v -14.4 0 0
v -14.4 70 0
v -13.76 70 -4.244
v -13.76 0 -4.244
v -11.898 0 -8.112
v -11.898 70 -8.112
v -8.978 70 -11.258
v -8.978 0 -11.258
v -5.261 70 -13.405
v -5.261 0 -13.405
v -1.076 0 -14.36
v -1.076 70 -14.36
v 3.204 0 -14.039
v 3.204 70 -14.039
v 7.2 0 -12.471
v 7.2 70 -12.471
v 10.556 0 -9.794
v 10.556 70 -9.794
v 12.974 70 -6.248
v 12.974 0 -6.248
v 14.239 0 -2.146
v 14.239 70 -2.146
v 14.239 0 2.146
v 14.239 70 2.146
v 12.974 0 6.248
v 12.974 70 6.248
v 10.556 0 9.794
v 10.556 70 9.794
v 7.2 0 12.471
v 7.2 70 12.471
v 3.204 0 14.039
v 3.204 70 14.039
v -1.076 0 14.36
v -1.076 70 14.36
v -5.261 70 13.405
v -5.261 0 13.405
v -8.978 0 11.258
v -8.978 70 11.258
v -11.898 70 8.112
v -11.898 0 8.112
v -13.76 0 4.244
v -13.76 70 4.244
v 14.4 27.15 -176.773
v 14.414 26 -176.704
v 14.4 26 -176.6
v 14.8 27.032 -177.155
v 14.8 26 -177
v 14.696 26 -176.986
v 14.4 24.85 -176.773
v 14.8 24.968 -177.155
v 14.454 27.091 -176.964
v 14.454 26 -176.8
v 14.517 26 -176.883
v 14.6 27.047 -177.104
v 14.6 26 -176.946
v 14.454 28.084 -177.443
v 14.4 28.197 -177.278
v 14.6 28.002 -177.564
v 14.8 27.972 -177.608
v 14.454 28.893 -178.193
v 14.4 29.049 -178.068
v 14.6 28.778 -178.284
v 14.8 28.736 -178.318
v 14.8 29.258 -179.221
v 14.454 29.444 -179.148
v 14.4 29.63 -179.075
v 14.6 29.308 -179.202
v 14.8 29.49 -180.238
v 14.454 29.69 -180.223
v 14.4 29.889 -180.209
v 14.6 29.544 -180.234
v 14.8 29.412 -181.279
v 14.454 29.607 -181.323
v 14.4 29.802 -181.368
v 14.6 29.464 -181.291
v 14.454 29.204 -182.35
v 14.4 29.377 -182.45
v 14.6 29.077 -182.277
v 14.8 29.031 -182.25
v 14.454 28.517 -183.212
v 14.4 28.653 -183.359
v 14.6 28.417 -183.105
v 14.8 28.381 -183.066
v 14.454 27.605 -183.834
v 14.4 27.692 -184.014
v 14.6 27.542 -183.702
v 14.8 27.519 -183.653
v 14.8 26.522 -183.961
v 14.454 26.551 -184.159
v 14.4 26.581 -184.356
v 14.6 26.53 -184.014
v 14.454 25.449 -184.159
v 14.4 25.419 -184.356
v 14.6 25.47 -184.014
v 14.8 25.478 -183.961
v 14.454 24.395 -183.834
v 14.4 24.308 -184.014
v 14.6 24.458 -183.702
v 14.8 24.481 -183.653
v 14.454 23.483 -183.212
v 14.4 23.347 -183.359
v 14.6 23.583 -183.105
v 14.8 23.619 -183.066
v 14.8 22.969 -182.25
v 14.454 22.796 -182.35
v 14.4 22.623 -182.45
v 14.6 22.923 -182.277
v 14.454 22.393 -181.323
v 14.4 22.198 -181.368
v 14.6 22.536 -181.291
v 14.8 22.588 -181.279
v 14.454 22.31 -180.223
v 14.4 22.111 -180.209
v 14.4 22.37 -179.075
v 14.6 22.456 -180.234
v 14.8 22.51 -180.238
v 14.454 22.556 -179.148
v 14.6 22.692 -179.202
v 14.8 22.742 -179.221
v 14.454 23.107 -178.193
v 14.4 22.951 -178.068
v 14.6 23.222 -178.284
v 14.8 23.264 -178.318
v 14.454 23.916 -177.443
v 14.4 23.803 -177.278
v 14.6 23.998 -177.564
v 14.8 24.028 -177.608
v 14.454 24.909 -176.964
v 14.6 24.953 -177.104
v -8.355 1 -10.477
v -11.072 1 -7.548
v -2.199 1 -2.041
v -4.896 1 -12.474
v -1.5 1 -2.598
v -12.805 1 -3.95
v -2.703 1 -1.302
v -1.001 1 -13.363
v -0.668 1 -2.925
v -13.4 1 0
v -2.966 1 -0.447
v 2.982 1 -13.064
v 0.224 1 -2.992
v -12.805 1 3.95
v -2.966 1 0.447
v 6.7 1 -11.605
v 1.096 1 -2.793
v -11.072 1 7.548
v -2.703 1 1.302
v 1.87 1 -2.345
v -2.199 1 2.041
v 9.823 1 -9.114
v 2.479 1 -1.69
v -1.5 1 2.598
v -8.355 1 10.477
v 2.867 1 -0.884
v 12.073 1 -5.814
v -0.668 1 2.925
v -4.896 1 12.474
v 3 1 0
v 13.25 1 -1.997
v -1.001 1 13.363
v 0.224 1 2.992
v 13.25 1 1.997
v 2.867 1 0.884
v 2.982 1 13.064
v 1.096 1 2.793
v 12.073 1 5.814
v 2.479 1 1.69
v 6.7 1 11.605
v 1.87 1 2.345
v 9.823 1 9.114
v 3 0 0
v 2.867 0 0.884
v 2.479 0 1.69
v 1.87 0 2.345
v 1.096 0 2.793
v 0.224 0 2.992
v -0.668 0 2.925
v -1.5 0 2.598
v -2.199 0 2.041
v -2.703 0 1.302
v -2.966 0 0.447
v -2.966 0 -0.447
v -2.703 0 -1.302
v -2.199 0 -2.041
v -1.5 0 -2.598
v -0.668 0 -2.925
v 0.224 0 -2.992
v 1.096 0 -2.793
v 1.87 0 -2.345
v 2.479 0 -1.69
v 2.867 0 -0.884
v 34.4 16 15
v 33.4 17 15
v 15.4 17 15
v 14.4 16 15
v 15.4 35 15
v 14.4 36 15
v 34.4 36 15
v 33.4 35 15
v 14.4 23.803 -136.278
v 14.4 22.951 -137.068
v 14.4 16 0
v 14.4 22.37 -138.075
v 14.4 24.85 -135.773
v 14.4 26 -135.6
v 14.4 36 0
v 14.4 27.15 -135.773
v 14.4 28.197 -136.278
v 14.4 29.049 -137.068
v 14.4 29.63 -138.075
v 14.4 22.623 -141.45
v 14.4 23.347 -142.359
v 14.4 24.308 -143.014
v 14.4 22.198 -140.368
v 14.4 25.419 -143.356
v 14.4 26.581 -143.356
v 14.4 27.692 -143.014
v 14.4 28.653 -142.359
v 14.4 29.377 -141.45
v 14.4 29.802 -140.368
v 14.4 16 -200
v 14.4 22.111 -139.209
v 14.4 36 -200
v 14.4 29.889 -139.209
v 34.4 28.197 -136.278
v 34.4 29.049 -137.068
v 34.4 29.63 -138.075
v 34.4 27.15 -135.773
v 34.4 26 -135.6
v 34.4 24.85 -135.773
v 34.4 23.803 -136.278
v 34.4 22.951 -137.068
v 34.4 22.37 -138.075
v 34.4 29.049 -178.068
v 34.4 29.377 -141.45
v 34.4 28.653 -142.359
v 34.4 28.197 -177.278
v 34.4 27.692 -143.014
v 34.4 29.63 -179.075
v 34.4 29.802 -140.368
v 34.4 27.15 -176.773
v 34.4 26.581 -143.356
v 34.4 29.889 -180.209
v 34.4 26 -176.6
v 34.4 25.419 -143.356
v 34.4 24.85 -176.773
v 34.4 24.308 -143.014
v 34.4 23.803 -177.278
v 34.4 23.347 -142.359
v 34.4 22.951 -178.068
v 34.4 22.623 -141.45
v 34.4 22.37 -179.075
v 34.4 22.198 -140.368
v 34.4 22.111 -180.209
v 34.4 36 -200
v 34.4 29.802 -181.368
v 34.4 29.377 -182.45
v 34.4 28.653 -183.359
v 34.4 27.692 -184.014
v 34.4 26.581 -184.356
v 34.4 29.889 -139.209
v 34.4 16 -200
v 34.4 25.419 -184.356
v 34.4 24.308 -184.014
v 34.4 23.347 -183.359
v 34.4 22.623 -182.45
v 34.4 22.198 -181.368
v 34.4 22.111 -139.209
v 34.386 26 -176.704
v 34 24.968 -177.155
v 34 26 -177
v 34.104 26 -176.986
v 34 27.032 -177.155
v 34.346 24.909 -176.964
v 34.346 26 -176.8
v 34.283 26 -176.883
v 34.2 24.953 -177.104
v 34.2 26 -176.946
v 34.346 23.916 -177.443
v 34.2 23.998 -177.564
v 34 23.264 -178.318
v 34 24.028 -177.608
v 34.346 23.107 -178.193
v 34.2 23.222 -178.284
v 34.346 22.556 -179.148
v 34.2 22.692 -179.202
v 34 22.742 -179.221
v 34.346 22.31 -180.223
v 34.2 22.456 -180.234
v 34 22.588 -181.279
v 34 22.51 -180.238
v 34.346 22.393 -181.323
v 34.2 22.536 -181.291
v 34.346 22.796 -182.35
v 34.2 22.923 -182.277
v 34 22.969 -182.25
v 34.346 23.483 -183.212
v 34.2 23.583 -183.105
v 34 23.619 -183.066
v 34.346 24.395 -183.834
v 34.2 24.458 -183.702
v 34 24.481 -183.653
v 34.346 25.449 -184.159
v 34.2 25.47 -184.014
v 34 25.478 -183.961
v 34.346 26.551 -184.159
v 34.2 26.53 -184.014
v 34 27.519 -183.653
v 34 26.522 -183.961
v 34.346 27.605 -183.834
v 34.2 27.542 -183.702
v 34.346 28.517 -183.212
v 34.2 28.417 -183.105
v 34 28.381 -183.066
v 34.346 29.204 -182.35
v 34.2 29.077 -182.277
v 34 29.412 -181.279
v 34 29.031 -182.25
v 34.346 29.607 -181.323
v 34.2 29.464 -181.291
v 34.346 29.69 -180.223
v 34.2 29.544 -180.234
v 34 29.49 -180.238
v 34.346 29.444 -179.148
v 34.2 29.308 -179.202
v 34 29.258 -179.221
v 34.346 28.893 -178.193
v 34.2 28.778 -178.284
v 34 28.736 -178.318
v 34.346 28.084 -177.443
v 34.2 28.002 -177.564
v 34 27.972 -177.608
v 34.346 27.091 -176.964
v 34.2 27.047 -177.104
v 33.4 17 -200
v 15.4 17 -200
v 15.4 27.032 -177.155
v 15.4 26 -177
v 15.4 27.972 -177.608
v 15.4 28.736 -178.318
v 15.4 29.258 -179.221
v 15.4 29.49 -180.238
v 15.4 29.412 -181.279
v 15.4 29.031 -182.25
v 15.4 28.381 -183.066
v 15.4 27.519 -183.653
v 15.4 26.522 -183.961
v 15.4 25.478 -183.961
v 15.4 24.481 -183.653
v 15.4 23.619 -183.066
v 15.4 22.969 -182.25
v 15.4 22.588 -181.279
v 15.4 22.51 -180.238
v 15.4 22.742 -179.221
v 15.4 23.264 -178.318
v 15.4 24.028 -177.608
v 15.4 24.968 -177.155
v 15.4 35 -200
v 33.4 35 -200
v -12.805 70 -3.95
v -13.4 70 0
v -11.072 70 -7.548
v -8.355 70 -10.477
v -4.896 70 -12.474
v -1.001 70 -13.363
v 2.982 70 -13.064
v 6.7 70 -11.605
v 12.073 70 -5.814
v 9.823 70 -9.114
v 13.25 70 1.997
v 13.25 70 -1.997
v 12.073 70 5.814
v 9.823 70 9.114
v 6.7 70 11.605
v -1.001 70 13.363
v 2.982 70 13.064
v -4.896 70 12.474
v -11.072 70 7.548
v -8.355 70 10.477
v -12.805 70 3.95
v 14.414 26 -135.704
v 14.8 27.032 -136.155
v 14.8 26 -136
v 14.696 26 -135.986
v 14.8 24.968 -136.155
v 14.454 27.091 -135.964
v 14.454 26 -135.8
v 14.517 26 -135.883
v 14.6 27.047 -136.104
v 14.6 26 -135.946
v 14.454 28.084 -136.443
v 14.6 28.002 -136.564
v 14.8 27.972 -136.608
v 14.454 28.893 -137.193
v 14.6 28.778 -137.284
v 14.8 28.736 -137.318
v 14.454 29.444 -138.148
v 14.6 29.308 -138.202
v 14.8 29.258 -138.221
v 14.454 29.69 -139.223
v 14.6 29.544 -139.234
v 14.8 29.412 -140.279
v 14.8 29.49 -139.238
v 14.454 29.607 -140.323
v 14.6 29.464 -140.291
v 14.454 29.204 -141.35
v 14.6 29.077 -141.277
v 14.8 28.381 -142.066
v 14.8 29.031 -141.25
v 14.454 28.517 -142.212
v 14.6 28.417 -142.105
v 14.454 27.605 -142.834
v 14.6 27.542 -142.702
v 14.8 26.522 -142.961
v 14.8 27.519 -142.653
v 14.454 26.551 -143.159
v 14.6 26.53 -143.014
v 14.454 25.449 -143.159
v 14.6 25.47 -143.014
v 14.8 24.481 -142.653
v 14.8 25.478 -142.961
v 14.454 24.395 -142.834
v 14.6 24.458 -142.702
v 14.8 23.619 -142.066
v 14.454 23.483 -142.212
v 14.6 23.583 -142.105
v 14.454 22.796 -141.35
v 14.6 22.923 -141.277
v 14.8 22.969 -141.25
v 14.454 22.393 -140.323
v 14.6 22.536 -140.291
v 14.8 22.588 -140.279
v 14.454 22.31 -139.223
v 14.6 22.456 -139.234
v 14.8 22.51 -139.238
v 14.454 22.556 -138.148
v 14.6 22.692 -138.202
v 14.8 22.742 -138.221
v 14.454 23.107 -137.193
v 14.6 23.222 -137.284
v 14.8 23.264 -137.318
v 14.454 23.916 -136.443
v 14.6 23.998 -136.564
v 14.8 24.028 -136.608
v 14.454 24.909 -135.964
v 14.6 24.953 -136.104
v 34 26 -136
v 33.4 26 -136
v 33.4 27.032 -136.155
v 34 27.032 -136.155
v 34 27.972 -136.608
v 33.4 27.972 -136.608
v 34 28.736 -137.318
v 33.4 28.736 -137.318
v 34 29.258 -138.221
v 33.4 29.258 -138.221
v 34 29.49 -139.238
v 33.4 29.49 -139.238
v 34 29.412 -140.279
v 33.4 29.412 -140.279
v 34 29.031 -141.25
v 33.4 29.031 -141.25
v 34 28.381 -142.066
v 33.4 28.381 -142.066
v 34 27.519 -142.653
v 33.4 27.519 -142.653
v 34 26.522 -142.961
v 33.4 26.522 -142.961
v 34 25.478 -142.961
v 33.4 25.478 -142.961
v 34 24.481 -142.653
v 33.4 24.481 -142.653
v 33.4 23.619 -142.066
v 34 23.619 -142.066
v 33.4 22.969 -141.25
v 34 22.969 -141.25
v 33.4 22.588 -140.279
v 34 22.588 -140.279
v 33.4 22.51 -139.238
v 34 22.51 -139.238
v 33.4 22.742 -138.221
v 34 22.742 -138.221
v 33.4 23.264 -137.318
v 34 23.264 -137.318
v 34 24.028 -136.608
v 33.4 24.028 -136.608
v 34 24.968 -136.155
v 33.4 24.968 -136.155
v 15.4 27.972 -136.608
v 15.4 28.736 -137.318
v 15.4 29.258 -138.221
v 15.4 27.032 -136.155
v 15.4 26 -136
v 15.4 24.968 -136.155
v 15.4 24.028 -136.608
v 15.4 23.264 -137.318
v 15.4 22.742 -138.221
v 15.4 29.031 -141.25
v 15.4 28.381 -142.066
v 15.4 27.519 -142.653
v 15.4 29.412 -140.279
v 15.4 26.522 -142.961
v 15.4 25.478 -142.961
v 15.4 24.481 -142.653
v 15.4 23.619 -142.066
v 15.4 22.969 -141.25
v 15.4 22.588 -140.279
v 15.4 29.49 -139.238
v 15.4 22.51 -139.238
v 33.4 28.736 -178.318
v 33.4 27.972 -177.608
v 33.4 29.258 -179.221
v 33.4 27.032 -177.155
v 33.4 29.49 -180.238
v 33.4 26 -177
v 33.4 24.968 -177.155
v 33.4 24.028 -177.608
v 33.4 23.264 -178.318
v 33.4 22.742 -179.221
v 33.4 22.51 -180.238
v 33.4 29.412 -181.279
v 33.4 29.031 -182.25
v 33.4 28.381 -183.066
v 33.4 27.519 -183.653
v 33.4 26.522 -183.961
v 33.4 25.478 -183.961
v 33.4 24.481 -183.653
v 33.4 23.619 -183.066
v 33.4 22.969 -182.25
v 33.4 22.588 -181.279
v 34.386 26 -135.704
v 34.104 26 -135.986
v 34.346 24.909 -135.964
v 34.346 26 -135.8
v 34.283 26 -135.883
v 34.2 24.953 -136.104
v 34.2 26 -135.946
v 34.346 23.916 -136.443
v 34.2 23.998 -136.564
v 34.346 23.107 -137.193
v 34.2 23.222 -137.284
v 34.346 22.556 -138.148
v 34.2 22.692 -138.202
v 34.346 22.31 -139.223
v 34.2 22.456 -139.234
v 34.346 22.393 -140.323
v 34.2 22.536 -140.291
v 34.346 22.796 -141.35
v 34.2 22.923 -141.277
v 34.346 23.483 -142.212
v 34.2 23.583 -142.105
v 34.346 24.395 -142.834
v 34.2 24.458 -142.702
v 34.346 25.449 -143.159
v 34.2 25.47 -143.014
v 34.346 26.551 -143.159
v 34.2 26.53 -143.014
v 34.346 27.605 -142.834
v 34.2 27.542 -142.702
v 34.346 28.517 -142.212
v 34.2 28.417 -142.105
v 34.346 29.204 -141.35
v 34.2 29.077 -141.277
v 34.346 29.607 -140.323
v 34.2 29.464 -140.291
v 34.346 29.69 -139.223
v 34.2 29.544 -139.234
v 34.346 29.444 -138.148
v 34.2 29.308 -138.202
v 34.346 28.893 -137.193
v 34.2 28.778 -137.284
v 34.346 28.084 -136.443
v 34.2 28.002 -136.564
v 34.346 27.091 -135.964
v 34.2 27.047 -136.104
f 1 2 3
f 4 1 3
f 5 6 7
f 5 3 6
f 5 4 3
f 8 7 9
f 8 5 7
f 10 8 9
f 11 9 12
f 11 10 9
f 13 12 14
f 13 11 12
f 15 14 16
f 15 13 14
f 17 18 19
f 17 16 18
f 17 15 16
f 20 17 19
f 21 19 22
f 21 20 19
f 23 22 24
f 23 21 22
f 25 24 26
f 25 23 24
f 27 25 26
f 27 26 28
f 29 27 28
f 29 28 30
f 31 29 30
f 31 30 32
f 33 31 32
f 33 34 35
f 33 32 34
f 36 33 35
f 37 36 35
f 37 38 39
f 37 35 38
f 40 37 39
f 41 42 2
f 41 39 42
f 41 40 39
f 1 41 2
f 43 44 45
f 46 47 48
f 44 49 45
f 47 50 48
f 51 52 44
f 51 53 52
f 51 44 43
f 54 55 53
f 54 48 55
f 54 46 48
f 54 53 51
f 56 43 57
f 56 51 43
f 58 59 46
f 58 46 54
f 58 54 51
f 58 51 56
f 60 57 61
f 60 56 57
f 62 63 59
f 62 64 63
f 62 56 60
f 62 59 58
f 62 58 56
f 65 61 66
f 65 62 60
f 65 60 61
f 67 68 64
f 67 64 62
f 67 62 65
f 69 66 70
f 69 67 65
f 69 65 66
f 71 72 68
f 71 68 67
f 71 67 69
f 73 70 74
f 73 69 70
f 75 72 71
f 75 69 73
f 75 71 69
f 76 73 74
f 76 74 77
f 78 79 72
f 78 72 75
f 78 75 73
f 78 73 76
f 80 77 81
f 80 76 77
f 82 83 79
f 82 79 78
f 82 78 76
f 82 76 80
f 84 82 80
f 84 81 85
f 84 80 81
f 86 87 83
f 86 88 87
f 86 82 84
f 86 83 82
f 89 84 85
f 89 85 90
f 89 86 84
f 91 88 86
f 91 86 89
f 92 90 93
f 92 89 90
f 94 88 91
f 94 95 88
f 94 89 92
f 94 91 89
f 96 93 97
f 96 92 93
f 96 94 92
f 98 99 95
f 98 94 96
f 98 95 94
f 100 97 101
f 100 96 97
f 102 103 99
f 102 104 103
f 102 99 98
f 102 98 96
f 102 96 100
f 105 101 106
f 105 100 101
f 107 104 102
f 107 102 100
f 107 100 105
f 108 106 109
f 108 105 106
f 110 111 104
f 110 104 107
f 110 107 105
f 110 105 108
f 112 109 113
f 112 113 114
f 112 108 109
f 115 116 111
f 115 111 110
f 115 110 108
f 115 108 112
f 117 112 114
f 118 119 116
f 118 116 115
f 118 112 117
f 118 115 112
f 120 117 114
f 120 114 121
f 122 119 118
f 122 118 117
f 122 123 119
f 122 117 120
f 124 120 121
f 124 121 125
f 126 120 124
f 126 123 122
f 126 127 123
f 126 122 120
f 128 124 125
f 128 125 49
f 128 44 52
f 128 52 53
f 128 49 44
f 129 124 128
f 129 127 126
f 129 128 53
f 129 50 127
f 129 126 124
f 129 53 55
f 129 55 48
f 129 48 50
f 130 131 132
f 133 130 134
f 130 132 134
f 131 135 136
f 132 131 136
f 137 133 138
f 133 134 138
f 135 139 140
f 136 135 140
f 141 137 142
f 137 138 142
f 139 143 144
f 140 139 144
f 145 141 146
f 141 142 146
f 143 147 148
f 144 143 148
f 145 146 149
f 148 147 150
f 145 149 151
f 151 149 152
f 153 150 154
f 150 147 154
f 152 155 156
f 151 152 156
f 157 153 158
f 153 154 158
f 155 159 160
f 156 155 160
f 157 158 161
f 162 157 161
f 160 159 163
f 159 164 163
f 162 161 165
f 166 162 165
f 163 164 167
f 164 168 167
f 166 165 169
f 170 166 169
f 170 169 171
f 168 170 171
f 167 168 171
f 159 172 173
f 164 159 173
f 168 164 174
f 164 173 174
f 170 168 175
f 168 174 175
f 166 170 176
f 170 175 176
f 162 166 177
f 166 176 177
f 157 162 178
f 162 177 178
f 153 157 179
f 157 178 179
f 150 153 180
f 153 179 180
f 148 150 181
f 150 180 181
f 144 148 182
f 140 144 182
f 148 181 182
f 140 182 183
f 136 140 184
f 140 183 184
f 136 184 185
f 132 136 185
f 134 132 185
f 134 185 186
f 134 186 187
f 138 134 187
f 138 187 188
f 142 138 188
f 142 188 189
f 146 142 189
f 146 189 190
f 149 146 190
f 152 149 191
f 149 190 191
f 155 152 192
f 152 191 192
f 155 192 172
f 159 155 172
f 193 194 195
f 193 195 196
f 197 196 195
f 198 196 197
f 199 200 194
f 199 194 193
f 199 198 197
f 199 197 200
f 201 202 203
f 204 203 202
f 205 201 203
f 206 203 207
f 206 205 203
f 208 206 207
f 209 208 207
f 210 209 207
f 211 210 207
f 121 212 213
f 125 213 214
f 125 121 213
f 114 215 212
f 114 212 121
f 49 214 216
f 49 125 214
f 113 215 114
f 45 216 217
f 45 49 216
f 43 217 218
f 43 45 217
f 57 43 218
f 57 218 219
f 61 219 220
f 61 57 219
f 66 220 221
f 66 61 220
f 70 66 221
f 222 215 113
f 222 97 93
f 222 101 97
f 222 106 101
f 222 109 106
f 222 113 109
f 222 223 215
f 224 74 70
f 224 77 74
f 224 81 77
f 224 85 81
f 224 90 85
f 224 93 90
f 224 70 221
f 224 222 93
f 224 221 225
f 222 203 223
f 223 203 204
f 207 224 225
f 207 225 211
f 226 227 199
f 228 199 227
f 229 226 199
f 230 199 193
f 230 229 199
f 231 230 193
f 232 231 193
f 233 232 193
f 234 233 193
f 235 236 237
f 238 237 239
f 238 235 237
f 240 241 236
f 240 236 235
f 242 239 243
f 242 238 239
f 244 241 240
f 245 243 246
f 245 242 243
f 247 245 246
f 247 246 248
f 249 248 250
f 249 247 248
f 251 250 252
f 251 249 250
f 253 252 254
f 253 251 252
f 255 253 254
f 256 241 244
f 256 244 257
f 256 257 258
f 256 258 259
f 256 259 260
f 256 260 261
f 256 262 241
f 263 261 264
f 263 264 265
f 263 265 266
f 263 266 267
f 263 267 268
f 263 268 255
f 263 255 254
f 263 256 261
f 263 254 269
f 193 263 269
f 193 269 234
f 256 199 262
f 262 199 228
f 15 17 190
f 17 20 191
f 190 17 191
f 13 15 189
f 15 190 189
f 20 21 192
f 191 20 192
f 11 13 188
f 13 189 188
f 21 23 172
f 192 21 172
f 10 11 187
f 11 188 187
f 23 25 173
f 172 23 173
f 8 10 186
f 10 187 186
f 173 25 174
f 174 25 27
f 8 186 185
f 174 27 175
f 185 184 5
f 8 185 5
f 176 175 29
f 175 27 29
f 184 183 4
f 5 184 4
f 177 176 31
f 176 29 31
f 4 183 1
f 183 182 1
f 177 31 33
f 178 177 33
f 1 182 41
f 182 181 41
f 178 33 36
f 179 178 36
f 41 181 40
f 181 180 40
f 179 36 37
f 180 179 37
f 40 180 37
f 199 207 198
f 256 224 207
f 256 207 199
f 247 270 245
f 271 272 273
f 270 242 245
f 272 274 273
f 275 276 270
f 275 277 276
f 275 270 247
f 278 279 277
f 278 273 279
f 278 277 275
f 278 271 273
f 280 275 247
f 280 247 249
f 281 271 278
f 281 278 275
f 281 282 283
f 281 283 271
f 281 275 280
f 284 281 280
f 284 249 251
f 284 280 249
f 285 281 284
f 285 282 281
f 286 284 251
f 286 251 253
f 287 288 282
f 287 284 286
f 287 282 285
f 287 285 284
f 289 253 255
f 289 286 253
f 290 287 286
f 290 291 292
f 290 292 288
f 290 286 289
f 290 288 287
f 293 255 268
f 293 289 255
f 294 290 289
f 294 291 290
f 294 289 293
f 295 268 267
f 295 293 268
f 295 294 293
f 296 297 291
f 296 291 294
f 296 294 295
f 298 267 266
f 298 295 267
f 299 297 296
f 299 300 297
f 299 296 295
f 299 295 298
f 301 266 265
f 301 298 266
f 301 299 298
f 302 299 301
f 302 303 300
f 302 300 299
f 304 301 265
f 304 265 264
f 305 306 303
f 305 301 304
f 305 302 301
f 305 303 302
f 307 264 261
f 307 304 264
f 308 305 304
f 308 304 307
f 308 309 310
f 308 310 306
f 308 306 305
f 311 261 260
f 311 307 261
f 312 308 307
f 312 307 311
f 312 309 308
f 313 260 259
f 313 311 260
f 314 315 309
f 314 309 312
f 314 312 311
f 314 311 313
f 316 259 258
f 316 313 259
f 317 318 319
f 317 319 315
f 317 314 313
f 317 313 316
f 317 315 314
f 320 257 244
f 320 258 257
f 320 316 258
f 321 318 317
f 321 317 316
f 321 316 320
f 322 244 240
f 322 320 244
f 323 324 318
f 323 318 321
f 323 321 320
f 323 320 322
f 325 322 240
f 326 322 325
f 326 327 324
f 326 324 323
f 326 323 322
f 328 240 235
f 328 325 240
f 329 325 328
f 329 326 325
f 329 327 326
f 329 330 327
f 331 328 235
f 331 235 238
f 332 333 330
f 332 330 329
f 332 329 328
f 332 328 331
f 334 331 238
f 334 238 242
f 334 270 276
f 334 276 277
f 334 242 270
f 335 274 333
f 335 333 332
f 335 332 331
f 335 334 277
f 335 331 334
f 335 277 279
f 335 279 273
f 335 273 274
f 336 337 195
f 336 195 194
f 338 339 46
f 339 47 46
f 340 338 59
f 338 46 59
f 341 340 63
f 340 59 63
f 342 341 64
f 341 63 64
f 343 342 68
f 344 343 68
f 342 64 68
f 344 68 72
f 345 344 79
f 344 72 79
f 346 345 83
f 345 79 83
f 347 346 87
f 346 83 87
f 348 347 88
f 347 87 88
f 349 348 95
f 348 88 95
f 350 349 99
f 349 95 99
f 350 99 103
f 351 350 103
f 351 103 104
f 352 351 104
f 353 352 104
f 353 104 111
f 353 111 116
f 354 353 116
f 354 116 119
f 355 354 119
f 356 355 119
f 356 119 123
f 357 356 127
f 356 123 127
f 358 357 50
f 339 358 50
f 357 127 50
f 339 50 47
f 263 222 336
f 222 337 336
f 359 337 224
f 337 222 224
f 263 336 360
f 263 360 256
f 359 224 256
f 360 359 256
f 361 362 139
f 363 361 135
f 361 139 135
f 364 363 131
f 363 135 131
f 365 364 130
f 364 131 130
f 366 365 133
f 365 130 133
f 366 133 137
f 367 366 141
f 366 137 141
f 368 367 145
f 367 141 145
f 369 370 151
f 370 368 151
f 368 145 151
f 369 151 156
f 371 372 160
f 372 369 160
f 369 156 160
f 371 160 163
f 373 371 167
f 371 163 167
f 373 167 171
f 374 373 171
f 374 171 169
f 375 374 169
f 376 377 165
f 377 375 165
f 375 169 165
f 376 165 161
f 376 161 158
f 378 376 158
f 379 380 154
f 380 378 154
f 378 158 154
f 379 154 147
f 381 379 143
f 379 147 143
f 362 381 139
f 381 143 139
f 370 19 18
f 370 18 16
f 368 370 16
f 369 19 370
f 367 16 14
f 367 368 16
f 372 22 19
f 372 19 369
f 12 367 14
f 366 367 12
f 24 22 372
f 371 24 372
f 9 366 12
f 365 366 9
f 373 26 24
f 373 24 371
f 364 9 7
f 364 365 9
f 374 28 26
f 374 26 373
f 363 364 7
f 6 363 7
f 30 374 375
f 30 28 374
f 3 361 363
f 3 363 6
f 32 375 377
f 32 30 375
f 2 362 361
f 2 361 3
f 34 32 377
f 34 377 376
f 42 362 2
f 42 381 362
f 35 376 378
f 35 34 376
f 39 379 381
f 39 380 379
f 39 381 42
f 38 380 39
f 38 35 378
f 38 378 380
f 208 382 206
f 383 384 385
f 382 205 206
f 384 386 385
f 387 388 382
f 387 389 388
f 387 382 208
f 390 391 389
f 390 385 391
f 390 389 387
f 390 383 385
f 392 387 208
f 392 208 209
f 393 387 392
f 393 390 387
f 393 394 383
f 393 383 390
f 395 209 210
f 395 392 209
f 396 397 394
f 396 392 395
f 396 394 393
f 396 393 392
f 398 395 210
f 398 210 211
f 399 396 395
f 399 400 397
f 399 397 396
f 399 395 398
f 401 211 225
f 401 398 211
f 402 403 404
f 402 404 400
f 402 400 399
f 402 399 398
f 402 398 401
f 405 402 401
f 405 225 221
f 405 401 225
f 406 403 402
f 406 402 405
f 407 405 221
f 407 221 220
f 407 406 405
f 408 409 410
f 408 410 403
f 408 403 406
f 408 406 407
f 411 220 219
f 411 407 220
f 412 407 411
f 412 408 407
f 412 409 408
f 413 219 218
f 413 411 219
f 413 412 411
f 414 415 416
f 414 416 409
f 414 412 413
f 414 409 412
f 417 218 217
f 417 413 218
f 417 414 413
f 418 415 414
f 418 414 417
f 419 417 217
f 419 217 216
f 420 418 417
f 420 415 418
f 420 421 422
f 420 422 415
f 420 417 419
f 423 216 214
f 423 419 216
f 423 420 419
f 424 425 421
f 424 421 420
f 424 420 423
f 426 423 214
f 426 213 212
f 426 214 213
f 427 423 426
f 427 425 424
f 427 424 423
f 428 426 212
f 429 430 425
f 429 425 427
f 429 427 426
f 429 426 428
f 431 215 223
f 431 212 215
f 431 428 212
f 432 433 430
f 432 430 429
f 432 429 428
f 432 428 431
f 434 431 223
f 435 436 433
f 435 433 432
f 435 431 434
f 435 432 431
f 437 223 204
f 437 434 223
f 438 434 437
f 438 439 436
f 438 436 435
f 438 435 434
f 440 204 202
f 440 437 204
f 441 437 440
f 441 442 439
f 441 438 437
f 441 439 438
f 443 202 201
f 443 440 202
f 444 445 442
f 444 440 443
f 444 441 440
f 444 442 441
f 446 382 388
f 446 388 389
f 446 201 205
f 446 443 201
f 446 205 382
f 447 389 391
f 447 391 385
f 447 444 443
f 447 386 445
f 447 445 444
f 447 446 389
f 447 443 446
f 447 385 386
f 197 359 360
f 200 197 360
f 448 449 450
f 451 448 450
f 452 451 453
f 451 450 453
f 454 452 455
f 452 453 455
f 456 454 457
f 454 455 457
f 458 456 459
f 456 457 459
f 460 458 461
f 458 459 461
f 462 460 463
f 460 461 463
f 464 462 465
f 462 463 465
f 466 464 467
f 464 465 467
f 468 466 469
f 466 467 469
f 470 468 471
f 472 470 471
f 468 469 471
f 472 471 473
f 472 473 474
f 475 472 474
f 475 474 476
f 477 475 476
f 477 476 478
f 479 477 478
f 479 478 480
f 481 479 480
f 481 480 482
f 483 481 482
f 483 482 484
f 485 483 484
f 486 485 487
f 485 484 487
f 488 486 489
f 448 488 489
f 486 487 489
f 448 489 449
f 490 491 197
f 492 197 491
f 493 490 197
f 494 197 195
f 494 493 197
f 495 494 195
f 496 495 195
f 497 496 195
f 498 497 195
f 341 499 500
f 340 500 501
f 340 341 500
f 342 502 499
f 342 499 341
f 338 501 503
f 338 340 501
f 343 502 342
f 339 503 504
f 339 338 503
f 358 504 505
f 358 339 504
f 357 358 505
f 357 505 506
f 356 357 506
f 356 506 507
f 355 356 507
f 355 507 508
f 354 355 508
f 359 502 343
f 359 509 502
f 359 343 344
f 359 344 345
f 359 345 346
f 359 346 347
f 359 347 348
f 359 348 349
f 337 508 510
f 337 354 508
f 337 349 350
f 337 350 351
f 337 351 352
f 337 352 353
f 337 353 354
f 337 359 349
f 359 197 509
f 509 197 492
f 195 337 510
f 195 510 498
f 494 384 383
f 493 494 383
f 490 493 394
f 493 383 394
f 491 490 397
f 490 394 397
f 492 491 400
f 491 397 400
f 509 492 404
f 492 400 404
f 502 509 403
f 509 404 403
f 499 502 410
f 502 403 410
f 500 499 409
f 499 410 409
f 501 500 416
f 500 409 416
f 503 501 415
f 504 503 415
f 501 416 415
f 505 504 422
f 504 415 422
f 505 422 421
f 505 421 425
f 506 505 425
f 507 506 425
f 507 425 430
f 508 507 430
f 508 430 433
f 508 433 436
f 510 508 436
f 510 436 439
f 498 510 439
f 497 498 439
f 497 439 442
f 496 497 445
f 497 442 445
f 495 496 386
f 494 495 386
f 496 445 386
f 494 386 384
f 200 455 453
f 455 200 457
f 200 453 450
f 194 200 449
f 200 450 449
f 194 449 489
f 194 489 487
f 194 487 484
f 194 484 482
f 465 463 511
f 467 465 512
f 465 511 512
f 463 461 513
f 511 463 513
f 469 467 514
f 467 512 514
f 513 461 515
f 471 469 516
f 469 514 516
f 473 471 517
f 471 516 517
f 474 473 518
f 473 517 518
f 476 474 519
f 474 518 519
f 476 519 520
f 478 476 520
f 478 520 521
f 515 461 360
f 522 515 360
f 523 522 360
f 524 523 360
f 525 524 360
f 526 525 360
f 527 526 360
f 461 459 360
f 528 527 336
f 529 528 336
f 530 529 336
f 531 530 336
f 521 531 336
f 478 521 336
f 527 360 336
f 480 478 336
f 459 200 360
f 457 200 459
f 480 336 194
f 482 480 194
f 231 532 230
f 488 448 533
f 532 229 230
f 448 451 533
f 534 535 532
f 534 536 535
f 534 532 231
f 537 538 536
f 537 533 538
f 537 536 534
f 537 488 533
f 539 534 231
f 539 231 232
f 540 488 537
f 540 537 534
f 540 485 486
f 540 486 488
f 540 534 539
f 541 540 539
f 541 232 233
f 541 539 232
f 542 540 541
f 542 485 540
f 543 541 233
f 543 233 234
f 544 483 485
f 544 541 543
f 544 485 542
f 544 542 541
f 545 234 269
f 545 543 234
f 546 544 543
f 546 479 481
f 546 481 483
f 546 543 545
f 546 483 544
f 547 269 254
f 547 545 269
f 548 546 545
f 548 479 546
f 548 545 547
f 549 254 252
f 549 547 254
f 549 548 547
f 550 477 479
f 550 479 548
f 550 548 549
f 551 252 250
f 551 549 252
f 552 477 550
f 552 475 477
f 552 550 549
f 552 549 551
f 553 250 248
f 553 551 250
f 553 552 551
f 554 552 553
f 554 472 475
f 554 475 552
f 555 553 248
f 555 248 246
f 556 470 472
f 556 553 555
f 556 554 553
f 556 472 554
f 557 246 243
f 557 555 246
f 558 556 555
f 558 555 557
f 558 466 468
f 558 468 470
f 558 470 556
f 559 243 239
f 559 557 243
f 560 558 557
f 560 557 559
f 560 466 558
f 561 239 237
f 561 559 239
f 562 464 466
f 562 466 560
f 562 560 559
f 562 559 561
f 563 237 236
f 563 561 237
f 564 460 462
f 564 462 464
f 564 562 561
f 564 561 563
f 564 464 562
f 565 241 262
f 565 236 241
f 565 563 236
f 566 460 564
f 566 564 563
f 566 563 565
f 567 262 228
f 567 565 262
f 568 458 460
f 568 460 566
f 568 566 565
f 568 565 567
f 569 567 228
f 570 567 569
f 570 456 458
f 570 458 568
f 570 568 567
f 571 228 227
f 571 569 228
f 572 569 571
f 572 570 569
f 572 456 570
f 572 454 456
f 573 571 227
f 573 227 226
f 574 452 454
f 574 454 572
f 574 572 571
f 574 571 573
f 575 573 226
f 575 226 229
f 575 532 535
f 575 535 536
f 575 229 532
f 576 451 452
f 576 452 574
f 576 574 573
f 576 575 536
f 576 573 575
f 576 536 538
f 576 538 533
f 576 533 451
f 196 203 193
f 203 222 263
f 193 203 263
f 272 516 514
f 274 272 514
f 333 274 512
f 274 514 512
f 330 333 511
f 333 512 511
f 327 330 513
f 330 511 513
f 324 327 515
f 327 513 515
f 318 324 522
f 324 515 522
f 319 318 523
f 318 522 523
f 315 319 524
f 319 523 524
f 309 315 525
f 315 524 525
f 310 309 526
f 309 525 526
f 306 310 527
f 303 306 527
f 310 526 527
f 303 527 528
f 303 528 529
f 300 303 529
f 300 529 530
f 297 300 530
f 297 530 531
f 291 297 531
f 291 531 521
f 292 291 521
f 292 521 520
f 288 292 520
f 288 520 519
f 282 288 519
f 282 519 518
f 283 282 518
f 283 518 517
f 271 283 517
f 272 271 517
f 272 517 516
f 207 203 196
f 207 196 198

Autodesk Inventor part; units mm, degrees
ref_plane "YZ Plane" through (0, 0, 0) normal (1, 0, 0) x (0, 1, 0)
ref_plane "XZ Plane" through (0, 0, 0) normal (0, 1, 0) x (-1, 0, 0)
sketch "Esboço1" plane through (0, 0, 0) normal (0, 1, 0) x (-1, 0, 0)
  circle A0 centre (0, 0) radius 14.4
  circle A1 centre (0, 0) radius 13.4
  dimension "d0" = 28.8
  dimension "d1" = 1
extrude "Extrusão1" add sketch "Esboço1" along normal blind 70
sketch "Esboço2" plane through (0, 0, 0) normal (0, -1, 0) x (1, 0, 0)
  circle A0 centre (0, 0) radius 14.4
extrude "Extrusão2" add sketch "Esboço2" against normal blind 1
ref_plane "Plano de trabalho1" through (0, 0, 14.4) normal (0, 0, 1) x (1, 0, 0)
sketch "Esboço3" plane through (0, 0, 0) normal (0, 0, 1) x (1, 0, 0)
  line L0 (-14.4, 0) -> (14.4, 0) projected
  line L1 (14.4, 0) -> (14.4, 16)
  line L2 (14.4, 0) -> (14.4, 70) projected
  line L3 (14.4, 16) -> (34.4, 16)
  line L4 (14.4, 36) -> (14.4, 16)
  line L5 (34.4, 16) -> (14.4, 16)
  line L6 (14.4, 16) -> (14.4, 36)
  line L7 (14.4, 36) -> (34.4, 36)
  line L8 (34.4, 36) -> (34.4, 16)
  line L9 (34.4, 16) -> (14.4, 16)
  line L10 (14.4, 16) -> (14.4, 36)
  line L11 (15.4, 35) -> (33.4, 35)
  line L12 (33.4, 35) -> (33.4, 17)
  line L13 (15.4, 17) -> (33.4, 17)
  line L14 (15.4, 36) -> (15.4, 16)
  point P0 (0, 0)
  dimension "d7" = 16
  dimension "d8" = 20
  dimension "d11" = 1
  dimension "d12" = 1
  dimension "d13" = 1
extrude "Extrusão3" add sketch "Esboço3" along normal blind 15 and the other way blind 200 contours L2 L7 L14 L3 | L14 L13 L12 L11 L7 L8 L3
sketch "Esboço4" plane through (0, 0, 0) normal (0, -1, 0) x (1, 0, 0)
  circle A0 centre (0, 0) radius 3
  dimension "d18" = 6
extrude "Extrusão4" cut sketch "Esboço4" against normal blind 15
sketch "Esboço5" plane through (14.4, 16, 0) normal (-1, 0, 0) x (0, 0, 1)
  line L0 (-200, 1) -> (-200, 19) projected
  circle A0 centre (-180.5, 10) radius 3.5
  circle A1 centre (-139.5, 10) radius 3.5
  line L1 (-139.5, 10) -> (-180.5, 10)
  point P0 (0, -16)
  dimension "d33" = 7
  dimension "d34" = 41
extrude "Extrusão5" cut sketch "Esboço5" against normal blind 30
sketch "Esboço6" plane through (14.4, 16, 0) normal (-1, 0, 0) x (0, 0, 1)
  circle A0 centre (-180.5, 10) radius 3.5 projected
  circle A1 centre (-139.5, 10) radius 3.5 projected
  line L0 (-180.5, 10) -> (-139.5, 10)
  point P0 (0, -16)
extrude "Extrusão7" [suppressed]
fillet "Arredondamento1" radius 0.4 4 edges at (14.4, 26, -184) (14.4, 26, -143) (34.4, 26, -143) (34.4, 26, -184)
properties part number "base e suporte"
